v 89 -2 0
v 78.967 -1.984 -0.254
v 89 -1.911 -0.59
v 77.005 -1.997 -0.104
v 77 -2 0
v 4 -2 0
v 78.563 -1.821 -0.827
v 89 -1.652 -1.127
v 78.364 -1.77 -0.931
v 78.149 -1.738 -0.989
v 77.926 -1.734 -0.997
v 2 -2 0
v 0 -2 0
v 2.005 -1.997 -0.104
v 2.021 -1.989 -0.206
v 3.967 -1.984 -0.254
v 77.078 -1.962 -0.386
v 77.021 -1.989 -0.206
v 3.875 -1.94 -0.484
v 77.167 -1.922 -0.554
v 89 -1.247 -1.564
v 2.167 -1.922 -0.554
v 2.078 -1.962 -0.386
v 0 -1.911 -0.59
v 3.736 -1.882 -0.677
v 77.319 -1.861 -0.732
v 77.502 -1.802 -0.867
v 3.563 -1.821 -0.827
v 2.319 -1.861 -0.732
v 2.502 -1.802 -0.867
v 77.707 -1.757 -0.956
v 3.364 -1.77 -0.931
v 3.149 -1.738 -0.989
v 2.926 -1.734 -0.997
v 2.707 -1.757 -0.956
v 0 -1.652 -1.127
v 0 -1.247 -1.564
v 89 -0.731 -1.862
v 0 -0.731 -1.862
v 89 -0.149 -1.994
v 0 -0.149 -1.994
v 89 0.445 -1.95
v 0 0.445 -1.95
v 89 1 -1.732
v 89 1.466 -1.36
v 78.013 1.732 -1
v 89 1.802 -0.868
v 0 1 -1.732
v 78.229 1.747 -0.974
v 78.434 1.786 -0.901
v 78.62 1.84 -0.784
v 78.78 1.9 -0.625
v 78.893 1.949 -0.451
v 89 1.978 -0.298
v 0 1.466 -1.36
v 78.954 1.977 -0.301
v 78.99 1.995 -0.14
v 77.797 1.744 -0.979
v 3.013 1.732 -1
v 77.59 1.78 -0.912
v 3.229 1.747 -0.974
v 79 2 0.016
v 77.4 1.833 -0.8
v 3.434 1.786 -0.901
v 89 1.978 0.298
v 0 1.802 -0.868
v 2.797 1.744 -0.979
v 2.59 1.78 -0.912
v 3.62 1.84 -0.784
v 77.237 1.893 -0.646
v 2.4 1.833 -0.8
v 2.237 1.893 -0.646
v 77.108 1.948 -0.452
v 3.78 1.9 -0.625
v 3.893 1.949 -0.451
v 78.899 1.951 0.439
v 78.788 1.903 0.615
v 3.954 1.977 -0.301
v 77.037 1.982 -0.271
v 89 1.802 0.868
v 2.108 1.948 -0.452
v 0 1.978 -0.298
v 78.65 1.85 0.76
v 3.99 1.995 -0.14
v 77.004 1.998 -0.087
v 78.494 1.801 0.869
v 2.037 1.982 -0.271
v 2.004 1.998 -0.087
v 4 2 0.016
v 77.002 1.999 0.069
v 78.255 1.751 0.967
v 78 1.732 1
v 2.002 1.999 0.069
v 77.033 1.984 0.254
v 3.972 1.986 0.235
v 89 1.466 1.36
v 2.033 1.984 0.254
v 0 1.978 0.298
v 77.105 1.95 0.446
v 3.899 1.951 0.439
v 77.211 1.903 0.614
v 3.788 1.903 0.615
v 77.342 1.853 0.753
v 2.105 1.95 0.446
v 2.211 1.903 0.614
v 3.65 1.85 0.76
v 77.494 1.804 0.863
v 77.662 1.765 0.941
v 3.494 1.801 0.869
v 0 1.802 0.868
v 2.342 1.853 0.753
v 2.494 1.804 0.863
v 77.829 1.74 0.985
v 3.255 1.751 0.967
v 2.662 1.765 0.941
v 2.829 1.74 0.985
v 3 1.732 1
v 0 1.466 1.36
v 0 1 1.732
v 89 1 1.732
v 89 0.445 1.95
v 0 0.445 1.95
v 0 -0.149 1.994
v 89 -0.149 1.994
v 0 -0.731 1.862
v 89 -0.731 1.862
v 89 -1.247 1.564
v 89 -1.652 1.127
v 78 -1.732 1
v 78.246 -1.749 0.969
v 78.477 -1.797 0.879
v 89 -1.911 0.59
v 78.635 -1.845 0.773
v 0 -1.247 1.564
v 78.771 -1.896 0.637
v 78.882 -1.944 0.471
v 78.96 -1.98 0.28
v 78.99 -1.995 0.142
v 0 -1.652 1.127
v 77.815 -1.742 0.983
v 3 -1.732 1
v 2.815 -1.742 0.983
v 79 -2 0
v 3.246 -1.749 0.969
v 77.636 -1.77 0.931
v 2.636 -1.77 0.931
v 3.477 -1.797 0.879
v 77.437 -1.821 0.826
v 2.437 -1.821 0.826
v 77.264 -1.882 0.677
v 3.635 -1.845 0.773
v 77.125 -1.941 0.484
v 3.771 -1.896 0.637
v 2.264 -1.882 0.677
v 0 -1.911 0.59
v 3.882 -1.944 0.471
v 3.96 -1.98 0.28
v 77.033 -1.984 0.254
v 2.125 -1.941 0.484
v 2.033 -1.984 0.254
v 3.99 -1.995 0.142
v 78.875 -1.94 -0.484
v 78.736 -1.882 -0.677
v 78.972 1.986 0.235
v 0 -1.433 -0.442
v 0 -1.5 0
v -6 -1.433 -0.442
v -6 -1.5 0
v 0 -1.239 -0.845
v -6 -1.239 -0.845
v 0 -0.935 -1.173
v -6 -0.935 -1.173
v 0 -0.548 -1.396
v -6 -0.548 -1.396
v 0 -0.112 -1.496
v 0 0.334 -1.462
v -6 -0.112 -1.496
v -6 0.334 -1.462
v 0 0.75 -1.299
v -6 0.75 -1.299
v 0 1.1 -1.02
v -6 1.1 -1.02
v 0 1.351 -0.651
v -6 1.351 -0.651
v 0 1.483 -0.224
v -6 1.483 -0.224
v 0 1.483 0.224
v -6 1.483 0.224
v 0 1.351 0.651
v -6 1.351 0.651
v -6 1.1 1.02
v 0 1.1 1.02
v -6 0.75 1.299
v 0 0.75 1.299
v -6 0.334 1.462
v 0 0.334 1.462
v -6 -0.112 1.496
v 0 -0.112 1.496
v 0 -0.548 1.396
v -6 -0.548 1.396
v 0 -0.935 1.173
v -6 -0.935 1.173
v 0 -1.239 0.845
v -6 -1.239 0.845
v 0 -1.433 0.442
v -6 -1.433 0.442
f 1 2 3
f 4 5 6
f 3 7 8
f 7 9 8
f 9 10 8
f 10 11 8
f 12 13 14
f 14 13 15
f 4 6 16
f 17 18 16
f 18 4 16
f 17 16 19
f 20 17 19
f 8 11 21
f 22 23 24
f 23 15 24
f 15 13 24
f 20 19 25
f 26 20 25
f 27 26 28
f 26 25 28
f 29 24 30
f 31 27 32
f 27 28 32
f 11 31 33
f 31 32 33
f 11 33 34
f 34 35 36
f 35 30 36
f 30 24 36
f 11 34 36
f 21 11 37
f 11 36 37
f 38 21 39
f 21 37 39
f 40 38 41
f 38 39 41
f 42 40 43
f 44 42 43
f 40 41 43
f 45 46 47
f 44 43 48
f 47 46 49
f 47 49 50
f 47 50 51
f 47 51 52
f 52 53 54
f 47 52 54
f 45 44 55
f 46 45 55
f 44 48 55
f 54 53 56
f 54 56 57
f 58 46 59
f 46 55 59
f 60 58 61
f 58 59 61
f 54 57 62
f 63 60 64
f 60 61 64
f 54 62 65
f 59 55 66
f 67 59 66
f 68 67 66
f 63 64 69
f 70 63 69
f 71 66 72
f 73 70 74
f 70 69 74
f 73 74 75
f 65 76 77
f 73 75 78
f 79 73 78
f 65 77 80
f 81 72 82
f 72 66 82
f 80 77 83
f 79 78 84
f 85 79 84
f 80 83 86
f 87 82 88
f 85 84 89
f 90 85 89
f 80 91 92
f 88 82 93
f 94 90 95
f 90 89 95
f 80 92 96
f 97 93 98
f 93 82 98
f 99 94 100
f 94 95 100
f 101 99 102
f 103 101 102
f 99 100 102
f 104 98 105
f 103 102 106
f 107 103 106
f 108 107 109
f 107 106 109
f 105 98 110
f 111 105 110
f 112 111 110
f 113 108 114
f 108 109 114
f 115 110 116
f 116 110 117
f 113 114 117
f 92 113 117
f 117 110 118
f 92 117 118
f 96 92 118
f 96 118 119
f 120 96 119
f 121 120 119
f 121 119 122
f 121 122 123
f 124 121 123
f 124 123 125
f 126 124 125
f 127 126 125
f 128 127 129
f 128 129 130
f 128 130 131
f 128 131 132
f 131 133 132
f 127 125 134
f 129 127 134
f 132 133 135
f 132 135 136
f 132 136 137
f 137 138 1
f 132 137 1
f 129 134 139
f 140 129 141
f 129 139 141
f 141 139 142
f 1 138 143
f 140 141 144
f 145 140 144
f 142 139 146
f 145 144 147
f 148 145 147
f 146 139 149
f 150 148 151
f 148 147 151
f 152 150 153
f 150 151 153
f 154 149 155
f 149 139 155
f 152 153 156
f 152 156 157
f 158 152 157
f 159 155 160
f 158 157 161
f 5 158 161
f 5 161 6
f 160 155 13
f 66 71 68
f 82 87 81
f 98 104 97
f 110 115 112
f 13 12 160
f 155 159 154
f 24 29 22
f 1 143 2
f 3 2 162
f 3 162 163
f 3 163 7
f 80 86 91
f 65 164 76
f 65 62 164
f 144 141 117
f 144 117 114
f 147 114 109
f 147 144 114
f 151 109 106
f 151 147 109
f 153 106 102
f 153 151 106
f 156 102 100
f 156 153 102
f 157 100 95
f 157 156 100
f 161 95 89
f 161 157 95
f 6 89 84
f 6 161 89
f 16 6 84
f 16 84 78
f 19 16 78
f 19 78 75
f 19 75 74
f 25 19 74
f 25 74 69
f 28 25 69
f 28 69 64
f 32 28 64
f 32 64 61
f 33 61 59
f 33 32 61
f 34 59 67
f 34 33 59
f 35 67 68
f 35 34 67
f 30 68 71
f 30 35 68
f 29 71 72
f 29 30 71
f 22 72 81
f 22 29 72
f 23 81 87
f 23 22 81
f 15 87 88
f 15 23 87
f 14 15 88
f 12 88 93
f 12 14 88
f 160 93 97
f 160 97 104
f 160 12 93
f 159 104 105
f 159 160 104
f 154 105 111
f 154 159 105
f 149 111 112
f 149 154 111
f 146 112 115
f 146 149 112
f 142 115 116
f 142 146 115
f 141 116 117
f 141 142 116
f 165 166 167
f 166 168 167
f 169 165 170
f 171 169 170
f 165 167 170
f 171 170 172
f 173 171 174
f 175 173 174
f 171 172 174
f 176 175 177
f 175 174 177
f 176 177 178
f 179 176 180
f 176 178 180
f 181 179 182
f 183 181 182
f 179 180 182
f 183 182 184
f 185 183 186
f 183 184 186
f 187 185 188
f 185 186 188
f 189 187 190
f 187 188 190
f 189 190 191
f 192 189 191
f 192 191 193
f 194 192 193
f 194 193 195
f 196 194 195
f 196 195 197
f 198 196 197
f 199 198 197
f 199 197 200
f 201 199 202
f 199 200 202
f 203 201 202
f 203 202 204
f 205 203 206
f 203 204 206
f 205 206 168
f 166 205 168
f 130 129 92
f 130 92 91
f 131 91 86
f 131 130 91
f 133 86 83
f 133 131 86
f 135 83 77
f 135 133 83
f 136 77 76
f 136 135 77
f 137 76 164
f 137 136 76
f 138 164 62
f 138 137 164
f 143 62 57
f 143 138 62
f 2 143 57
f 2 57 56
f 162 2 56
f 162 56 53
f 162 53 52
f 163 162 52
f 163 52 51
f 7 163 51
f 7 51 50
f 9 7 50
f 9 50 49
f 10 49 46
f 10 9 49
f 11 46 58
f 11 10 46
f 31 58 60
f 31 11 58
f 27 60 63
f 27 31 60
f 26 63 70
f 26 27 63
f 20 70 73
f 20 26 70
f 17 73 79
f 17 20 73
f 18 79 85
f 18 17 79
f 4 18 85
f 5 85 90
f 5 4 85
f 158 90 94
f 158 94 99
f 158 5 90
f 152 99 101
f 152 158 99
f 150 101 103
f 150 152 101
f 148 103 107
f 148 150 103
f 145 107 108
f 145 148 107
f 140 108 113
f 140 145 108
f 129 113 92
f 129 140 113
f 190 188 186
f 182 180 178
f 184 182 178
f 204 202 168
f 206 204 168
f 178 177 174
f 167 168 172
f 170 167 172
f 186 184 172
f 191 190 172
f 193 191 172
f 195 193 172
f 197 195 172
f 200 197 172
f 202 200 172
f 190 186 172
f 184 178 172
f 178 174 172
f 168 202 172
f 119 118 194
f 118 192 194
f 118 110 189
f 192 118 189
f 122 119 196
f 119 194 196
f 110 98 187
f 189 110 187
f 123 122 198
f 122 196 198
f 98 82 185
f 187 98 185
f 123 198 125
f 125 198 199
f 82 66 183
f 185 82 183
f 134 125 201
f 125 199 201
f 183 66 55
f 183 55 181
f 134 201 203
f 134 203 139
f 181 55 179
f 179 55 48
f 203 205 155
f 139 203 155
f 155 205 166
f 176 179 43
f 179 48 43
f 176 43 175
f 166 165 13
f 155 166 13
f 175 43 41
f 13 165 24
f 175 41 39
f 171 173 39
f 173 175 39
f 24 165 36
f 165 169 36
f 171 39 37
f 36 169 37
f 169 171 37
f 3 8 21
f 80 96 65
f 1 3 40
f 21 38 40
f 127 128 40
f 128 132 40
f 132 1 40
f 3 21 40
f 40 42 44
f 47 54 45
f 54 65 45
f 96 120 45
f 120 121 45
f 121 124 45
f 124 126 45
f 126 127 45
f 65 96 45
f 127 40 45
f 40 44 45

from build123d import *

# Parameters (mm, degrees)
CUT_EXTRUDE1_DEPTH      = 90.044932478
CUT_EXTRUDE1_DEPTH_BACK = 90.044932478
SKETCH3_R               = 1


with BuildPart() as part:
    # Sketch1 → Revolve1 (revolve)
    with BuildSketch(Plane.XY, mode=Mode.PRIVATE) as revolve1_sk:
        Polygon((0, 1.5), (-6, 1.5), (-6, 0), (89, 0), (89, 2), (0, 2), align=None)
    revolve(revolve1_sk.sketch.rotate(Axis((-6, 0, 0), (1, 0, 0)), 180), axis=Axis((-6, 0, 0), (1, 0, 0)))

    # Sketch3 → Cut-Extrude1 (cut, two sides: drawn at the far end of the back side and taken through both)
    with BuildSketch(Plane(origin=(0, 0, 0), x_dir=(1, 0, 0), z_dir=(0, 1, 0)).offset(-CUT_EXTRUDE1_DEPTH_BACK)):
        with Locations(Location((3, 0, 0), (0, 0, 270))):
            Circle(SKETCH3_R)
        with Locations(Location((78, 0, 0), (0, 0, 270))):
            Circle(SKETCH3_R)
    extrude(amount=CUT_EXTRUDE1_DEPTH + CUT_EXTRUDE1_DEPTH_BACK, mode=Mode.SUBTRACT)


solid = part.part
